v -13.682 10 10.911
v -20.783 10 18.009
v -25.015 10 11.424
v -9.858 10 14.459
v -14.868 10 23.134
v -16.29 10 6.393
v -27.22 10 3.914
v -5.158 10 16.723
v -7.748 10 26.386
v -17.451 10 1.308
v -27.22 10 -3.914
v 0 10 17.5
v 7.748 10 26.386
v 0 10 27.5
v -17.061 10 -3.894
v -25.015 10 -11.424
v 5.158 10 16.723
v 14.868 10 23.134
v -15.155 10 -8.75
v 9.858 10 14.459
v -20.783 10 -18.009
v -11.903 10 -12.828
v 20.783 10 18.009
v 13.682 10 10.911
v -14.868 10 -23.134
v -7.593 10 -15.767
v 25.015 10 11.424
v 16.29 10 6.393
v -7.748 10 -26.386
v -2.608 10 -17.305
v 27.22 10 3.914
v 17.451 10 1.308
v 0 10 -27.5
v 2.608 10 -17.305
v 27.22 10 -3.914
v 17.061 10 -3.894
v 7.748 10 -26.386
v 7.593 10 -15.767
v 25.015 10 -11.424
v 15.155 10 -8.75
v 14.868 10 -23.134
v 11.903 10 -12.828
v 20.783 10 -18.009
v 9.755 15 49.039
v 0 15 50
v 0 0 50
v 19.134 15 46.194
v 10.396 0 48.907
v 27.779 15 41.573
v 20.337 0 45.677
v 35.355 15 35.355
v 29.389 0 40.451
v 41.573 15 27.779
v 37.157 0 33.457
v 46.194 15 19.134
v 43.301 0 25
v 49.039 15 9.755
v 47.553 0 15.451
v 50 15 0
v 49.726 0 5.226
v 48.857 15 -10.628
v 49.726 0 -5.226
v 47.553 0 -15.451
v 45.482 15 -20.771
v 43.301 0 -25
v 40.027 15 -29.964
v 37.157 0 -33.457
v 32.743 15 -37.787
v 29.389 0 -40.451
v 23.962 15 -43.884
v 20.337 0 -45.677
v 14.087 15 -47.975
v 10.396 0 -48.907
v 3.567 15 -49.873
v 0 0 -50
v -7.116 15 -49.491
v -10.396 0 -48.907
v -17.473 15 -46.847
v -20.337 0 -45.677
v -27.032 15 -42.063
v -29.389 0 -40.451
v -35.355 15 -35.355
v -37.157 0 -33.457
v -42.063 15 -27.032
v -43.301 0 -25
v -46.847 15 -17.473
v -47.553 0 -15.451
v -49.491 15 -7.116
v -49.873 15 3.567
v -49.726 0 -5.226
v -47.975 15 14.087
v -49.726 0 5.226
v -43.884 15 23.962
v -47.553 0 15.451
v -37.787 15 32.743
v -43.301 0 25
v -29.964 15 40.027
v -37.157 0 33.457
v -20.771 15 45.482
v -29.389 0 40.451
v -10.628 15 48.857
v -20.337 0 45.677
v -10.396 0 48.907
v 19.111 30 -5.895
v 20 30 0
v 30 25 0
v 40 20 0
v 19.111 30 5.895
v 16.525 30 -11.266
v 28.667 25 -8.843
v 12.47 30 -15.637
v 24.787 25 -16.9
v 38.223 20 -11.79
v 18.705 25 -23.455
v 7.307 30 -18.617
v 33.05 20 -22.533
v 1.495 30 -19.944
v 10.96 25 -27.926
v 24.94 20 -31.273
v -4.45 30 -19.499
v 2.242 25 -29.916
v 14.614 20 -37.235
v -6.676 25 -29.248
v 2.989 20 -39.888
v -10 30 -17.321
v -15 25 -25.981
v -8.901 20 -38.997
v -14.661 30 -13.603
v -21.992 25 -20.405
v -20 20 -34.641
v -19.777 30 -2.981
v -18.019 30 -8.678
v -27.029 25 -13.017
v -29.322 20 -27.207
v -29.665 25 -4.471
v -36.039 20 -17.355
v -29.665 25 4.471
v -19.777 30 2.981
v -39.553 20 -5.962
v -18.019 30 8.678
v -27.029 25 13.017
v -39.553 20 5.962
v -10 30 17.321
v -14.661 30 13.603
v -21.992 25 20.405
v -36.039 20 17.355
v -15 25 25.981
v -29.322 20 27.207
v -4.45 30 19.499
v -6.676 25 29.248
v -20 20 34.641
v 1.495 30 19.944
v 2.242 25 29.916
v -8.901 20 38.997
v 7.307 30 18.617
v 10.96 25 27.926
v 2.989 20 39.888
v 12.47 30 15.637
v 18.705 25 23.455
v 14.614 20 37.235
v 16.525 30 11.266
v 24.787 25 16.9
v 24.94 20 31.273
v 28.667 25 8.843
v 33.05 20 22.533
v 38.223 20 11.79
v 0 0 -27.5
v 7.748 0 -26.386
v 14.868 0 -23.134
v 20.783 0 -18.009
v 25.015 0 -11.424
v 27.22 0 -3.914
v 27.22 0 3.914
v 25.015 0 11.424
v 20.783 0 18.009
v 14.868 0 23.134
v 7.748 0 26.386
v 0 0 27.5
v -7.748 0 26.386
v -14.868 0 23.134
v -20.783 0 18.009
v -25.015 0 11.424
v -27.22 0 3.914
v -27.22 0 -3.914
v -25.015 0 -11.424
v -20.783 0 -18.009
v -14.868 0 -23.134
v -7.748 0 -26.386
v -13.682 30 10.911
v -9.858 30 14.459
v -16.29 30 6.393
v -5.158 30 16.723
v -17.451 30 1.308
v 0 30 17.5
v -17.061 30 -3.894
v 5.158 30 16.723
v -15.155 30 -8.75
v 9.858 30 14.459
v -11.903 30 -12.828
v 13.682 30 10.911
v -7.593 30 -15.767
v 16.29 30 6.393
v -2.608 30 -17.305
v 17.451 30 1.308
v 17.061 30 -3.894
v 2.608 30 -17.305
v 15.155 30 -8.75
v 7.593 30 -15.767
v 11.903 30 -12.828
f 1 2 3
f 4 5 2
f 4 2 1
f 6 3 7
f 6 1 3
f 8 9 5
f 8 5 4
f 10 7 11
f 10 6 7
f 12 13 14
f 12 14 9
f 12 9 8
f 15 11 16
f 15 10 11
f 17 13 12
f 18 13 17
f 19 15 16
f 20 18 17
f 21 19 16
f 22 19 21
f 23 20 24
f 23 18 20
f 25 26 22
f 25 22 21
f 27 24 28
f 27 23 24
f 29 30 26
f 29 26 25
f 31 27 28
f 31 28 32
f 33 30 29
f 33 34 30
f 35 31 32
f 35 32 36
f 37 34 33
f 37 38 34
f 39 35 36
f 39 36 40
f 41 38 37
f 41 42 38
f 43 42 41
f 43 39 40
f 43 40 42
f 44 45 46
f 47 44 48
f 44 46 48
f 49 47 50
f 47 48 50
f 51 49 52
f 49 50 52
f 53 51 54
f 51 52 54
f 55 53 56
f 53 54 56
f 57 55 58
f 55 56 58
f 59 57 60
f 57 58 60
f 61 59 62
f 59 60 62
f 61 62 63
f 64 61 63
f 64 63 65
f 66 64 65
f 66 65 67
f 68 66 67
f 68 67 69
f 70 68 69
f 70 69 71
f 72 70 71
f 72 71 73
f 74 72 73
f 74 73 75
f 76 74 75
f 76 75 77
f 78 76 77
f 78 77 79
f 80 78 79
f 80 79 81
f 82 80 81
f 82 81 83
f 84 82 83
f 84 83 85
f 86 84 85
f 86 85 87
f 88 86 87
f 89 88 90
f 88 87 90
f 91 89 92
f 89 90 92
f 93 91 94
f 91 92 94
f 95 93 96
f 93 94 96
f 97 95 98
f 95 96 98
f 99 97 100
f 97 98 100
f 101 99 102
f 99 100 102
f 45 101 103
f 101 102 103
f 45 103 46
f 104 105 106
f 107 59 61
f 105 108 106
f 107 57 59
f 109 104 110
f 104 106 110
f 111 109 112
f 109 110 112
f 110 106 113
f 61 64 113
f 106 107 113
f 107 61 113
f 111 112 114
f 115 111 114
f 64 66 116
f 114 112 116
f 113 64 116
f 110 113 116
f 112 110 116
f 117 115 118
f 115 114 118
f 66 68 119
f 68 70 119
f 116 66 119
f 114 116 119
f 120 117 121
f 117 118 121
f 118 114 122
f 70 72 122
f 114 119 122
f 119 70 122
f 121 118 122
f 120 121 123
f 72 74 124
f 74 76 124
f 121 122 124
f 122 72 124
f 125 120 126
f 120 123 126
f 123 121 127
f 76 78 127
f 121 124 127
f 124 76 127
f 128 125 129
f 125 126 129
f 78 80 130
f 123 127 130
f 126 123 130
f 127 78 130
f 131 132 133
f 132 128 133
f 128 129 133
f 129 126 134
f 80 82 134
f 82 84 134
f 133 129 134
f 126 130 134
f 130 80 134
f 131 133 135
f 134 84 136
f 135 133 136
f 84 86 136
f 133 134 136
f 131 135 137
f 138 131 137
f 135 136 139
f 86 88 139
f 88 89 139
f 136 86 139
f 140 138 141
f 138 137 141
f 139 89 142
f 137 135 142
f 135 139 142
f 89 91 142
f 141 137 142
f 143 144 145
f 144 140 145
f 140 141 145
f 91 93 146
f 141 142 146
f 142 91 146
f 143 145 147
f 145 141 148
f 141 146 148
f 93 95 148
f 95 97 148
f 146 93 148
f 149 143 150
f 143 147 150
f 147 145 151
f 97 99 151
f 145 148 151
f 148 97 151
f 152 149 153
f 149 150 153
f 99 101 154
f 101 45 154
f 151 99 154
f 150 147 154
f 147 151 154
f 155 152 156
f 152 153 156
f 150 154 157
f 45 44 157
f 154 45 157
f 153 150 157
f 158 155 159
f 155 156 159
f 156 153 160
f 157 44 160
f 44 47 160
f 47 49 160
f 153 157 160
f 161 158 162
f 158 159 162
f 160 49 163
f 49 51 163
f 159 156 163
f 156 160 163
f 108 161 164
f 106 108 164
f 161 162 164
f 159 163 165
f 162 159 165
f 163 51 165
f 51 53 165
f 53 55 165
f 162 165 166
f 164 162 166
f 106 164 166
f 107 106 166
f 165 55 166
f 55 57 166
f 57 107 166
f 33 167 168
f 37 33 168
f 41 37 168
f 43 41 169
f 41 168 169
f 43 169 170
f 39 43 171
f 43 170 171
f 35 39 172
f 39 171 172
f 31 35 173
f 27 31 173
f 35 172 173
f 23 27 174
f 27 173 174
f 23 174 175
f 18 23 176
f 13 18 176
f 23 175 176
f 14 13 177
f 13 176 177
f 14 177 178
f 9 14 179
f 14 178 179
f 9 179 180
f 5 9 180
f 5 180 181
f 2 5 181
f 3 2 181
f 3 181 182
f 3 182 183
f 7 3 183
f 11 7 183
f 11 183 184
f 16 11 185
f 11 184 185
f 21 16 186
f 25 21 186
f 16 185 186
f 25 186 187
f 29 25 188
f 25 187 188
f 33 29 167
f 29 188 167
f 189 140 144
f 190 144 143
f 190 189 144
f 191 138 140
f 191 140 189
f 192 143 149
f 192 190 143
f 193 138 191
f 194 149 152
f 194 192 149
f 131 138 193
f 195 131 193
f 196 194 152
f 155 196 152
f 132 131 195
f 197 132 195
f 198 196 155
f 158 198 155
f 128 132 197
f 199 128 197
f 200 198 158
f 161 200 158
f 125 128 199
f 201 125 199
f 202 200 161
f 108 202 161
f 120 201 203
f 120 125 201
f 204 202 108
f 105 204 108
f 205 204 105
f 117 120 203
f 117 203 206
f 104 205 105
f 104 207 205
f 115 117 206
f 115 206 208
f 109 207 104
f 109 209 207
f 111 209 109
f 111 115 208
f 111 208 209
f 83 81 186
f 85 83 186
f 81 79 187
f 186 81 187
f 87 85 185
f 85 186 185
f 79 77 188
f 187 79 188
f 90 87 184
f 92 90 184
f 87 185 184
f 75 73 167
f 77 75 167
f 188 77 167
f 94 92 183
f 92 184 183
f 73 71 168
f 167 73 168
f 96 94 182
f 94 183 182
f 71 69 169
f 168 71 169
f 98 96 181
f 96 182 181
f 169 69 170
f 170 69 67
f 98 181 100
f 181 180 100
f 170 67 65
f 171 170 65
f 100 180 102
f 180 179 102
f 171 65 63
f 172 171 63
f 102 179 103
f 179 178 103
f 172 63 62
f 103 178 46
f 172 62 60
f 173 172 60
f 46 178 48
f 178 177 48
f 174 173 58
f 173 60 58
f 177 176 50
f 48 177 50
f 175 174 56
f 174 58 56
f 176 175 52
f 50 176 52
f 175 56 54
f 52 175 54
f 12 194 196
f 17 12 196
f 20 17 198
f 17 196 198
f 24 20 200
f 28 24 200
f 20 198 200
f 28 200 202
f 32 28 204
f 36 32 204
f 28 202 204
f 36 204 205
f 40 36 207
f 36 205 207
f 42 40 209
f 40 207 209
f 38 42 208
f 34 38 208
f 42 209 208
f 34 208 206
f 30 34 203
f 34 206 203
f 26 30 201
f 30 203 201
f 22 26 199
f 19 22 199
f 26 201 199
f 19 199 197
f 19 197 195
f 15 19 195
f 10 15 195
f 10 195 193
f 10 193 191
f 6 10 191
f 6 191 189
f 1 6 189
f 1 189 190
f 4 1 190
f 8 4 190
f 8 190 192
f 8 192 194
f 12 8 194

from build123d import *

# Parameters (mm, degrees)
CROQUIS1_R              = 50
SALIENTE_EXTRUIR1_DEPTH = 15
CROQUIS3_R              = 20
CROQUIS4_R              = 17.5
CORTAR_EXTRUIR1_DEPTH   = 77.811457609
CROQUIS5_R              = 27.5
CORTAR_EXTRUIR2_DEPTH   = 10


with BuildPart() as part:
    # Croquis1 → Saliente-Extruir1 (new body)
    with BuildSketch(Plane(origin=(0, 0, 0), x_dir=(1, 0, 0), z_dir=(0, 1, 0))):
        with Locations(Location((0, 0, 0), (0, 0, 270))):
            Circle(CROQUIS1_R)
    extrude(amount=SALIENTE_EXTRUIR1_DEPTH)

    # Croquis3 → section 0 of recubrir1
    with BuildSketch(Plane(origin=(0, 30, 0), x_dir=(1, 0, 0), z_dir=(0, 1, 0)), mode=Mode.PRIVATE) as recubrir1_s0:
        Circle(CROQUIS3_R)
    # loft up to a face of the part (recubrir1)
    loft([recubrir1_s0.sketch, Face(Wire([part.edges().sort_by_distance((36.448431371, 15, -34.227355296))[0]]))])

    # Croquis4 → Cortar-Extruir1 (cut, through all)
    with BuildSketch(Plane(origin=(0, 30, 0), x_dir=(1, 0, 0), z_dir=(0, 1, 0))):
        with Locations(Location((0, 0, 0), (0, 0, 270))):
            Circle(CROQUIS4_R)
    extrude(amount=-CORTAR_EXTRUIR1_DEPTH, mode=Mode.SUBTRACT)

    # Croquis5 → Cortar-Extruir2 (cut)
    with BuildSketch(Plane.XZ):
        with Locations(Location((0, 0, 0), (0, 0, 270))):
            Circle(CROQUIS5_R)
    extrude(amount=-CORTAR_EXTRUIR2_DEPTH, mode=Mode.SUBTRACT)


solid = part.part
